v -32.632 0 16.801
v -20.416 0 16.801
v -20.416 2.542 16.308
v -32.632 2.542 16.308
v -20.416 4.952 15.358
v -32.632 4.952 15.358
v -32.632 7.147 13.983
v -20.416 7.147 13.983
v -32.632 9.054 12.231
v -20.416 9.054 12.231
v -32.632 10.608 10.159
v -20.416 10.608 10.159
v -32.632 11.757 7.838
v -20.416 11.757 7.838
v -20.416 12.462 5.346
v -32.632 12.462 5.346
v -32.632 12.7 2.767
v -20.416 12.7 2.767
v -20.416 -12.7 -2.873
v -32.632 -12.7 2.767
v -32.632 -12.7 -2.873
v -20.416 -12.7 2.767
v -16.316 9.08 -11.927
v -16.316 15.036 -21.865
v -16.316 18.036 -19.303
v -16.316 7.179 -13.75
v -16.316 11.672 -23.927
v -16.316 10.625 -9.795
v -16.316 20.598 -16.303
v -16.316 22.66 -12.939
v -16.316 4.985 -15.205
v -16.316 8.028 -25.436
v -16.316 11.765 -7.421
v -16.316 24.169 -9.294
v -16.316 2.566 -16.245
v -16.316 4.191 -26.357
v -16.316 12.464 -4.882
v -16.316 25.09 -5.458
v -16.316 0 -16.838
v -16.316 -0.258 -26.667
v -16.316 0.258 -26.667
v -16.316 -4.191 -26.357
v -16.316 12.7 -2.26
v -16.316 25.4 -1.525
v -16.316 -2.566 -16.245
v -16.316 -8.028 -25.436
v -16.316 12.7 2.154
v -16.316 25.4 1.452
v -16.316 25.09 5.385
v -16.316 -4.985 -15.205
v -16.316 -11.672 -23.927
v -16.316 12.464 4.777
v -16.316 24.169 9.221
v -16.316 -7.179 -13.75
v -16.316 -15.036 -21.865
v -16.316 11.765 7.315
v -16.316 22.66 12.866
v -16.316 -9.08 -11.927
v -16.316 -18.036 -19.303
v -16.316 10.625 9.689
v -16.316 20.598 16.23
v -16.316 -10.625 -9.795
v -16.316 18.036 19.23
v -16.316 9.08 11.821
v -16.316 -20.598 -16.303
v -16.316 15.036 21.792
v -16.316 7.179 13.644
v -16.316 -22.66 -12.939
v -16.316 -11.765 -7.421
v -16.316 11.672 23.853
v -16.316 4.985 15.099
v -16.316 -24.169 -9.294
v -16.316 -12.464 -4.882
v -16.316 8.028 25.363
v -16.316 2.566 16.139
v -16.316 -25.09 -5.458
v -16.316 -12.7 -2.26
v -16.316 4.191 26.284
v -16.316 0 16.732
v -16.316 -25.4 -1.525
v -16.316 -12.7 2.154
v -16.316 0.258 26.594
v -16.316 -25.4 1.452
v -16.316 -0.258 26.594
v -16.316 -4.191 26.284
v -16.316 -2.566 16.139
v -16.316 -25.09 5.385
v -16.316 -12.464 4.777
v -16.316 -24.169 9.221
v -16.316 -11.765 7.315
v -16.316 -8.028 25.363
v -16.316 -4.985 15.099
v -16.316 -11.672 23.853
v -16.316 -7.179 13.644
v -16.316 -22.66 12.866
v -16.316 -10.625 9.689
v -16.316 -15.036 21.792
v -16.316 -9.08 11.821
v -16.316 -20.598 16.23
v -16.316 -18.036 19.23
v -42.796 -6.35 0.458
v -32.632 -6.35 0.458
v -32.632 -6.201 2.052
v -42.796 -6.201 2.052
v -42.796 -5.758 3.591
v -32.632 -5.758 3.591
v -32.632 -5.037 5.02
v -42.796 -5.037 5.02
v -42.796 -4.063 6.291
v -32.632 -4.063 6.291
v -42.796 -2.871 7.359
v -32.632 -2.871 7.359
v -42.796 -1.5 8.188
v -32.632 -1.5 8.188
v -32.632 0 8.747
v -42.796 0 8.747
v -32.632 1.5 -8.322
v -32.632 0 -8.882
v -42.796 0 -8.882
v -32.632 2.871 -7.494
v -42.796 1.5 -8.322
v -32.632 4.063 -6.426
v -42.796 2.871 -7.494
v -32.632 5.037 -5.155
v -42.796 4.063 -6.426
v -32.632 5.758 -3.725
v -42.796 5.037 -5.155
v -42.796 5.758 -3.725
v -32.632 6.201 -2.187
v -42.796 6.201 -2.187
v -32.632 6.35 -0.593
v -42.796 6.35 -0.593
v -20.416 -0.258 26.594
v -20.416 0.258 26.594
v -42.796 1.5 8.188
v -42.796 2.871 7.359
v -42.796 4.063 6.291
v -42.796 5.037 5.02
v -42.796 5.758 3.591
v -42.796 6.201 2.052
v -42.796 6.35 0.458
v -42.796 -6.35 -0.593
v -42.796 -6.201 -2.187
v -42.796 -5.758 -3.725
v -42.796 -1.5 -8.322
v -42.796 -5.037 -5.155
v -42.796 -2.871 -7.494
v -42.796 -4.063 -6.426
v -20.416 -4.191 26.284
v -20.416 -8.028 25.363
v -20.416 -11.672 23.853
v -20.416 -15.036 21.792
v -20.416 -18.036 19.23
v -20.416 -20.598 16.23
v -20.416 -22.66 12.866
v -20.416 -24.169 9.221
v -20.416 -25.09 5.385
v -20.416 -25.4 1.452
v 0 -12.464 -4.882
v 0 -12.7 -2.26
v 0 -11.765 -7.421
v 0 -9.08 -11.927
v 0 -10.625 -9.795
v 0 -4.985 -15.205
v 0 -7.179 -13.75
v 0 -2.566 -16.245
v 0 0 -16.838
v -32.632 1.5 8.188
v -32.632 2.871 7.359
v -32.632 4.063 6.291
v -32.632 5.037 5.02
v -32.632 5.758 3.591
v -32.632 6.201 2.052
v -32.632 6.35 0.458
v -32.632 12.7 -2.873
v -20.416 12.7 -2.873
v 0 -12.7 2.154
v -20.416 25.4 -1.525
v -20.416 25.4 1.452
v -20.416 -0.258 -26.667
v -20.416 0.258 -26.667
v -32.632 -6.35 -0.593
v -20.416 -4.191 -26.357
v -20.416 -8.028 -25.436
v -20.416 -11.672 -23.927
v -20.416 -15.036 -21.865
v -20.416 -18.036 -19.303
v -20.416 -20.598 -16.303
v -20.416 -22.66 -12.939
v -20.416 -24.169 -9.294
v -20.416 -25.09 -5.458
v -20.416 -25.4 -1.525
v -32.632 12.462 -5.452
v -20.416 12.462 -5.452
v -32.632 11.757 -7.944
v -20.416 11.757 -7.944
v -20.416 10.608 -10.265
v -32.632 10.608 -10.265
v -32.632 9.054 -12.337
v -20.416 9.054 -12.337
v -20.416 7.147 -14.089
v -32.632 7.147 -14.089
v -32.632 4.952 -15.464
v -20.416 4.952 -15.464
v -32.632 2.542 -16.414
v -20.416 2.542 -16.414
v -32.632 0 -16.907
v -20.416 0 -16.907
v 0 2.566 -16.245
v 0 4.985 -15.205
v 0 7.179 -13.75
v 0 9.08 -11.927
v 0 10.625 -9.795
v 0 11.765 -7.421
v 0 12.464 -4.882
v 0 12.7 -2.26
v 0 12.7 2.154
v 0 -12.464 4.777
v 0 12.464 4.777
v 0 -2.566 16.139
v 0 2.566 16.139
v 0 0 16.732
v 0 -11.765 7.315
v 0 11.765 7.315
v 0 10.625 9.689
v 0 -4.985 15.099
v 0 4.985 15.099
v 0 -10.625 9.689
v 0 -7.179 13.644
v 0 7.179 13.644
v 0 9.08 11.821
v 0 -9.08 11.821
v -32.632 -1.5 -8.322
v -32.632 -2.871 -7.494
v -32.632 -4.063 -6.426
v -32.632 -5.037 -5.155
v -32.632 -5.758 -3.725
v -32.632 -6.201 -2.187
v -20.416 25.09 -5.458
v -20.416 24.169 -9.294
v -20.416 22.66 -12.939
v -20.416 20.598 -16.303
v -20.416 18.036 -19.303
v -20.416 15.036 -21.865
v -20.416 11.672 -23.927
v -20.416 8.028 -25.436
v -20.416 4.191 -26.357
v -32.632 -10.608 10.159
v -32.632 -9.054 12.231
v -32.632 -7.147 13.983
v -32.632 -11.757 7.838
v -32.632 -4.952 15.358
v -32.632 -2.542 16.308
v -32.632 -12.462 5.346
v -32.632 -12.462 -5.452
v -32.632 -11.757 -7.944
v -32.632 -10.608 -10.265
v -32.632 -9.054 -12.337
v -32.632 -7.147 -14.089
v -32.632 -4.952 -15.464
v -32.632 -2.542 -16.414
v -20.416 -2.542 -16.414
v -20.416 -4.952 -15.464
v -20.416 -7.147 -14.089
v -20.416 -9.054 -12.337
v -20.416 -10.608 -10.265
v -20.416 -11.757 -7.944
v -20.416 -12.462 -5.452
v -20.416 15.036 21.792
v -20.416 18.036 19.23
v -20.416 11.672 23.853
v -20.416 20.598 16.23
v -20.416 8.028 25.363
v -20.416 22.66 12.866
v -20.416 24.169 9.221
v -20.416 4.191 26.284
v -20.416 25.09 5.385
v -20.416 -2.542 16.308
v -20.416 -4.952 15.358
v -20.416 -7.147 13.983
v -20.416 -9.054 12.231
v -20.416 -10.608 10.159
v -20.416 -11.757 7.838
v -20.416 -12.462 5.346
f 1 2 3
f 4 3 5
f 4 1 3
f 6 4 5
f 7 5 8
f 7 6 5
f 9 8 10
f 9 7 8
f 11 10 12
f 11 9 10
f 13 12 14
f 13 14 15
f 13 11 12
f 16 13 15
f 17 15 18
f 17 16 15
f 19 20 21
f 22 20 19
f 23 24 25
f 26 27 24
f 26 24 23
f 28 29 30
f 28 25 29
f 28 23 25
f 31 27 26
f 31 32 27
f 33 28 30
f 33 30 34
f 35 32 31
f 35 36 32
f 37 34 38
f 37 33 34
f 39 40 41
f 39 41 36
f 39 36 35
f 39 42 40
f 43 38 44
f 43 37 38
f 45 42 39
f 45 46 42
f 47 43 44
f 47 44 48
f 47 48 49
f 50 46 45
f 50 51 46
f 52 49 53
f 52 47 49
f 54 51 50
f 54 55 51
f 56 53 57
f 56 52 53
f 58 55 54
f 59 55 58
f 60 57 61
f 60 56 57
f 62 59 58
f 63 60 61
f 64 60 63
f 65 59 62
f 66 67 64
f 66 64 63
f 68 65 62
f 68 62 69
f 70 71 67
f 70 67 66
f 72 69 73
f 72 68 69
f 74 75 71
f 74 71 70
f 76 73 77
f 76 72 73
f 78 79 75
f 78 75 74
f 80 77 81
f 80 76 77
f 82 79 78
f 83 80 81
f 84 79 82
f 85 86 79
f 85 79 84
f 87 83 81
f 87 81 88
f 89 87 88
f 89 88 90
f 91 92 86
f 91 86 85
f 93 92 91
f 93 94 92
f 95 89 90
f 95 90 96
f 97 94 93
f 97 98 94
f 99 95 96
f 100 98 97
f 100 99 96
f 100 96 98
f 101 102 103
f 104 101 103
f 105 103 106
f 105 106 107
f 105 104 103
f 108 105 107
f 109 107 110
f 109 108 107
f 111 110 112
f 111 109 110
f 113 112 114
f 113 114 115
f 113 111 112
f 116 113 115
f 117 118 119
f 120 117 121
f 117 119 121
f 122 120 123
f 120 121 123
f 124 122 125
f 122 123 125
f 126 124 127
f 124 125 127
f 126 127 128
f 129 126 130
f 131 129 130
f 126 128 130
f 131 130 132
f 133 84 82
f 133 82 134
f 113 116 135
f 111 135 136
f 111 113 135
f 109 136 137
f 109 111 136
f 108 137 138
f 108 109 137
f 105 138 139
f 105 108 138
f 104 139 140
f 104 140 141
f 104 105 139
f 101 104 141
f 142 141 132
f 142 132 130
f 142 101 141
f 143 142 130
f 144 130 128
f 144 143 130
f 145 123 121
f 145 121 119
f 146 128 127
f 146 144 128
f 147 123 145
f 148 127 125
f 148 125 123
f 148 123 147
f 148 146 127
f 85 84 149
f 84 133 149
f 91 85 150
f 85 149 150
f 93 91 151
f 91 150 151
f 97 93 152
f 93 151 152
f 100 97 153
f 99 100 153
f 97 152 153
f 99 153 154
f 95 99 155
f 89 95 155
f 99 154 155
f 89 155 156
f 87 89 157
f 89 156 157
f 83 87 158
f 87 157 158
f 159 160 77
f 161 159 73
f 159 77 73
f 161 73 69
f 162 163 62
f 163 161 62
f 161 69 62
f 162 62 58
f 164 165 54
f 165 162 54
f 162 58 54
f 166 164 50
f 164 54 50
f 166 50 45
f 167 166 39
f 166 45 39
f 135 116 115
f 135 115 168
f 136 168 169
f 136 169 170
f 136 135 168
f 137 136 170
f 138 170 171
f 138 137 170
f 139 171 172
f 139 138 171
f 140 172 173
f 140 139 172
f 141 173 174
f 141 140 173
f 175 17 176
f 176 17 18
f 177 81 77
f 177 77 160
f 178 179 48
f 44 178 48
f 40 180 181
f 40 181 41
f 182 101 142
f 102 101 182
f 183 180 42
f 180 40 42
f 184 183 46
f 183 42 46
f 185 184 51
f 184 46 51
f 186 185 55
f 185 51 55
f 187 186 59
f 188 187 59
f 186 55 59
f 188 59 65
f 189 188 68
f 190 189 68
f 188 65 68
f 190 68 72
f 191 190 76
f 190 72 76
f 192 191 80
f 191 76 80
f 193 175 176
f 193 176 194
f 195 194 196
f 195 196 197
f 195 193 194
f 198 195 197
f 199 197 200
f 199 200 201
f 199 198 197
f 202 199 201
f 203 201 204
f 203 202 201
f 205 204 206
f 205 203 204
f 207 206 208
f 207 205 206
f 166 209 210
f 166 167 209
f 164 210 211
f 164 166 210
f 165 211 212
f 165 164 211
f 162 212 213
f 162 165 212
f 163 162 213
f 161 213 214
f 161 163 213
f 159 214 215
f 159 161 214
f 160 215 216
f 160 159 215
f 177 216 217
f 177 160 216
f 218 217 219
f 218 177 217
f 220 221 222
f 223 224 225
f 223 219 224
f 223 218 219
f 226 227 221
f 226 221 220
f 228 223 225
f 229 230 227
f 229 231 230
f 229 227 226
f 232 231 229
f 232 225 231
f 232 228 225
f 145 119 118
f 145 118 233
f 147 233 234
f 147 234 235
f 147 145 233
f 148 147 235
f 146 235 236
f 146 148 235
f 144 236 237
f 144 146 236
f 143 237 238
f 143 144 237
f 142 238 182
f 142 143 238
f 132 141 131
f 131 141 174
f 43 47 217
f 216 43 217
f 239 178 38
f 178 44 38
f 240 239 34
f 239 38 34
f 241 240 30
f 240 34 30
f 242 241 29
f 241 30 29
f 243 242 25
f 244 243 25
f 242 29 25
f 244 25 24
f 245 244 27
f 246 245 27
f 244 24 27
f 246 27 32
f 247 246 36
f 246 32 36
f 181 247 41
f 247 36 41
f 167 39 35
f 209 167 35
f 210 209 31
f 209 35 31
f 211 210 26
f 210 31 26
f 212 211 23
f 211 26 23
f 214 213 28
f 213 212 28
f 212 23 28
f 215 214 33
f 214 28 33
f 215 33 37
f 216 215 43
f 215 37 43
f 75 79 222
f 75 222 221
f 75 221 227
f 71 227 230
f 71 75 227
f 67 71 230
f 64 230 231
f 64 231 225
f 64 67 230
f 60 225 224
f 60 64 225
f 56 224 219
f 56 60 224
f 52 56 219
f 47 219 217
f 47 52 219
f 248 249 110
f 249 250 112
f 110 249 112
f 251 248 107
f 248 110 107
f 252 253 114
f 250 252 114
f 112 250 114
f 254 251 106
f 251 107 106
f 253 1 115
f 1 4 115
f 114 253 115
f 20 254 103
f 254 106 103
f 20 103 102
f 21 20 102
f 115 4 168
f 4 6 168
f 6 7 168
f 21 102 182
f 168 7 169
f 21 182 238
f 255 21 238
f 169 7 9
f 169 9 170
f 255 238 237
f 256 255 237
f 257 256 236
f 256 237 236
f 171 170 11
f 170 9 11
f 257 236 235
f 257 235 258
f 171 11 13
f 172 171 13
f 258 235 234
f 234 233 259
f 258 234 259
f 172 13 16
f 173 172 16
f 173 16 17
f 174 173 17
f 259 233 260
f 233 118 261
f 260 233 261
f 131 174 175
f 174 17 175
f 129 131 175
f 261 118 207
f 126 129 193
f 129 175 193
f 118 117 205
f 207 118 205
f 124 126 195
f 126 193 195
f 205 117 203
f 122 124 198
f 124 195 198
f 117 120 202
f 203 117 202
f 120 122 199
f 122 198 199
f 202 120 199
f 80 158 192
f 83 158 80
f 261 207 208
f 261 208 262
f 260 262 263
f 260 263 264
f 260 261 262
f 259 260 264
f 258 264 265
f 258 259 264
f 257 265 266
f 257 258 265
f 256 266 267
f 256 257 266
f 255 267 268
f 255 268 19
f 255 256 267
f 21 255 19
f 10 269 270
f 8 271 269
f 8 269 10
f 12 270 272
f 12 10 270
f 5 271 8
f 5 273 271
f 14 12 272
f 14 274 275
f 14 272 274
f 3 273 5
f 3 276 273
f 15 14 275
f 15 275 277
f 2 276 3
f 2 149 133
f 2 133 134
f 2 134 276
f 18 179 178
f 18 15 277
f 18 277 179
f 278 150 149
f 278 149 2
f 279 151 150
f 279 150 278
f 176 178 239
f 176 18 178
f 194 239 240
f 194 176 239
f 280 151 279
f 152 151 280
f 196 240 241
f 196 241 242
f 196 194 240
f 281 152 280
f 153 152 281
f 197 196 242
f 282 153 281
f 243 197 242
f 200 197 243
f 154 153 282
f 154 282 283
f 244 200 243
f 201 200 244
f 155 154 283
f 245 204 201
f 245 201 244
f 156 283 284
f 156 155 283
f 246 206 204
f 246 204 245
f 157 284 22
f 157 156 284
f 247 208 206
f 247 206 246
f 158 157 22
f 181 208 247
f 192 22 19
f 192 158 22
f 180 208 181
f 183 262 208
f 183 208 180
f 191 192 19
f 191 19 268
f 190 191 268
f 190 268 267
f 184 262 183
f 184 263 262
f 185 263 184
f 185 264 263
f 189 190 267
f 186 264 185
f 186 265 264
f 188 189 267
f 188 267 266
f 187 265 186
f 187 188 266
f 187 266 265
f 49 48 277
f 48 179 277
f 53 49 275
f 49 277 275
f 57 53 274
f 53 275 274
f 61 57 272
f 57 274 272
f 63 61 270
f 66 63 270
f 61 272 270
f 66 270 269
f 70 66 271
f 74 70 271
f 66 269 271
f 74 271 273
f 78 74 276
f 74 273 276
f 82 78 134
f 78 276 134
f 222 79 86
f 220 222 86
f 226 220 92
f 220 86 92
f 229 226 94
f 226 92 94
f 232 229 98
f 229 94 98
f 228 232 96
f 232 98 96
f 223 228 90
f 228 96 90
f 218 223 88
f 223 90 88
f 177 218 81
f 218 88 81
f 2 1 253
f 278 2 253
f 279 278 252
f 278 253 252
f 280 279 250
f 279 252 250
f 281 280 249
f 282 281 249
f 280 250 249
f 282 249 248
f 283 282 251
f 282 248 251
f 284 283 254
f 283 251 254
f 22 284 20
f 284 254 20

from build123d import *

# Parameters (mm, degrees)
F1_DEPTH    = 25.4
F2_DEPTH    = 12.7
F3_DEPTH    = 6.35
F4_T1_DEPTH = 31.6265151256
F5_T1_DEPTH = 12.2162196785
F6_R        = 25.1416200386
F7_T1_DEPTH = 53.1085051667


# Not quite as in the source:
# - a fillet or chamfer that OpenCascade refuses, or shapes differently, is made with other operations: its cross-section is extruded or revolved along the edge and cut away or added


with BuildPart() as f1:
    # F0 (on Front) → F1 (new body, symmetric)
    with BuildSketch(Plane.XZ):
        Polygon((-20.4155612737, 26.5935901552), (-20.4155612737, 16.8710052967), (-20.4155612737, -16.9768668711), (-20.4155612737, -26.6668144614), (-16.3158904761, -26.6668144614), (-16.3158904761, -16.9768668711), (-16.3158904761, 16.8710052967), (-16.3158904761, 26.5935901552), align=None)
    extrude(amount=F1_DEPTH, both=True)

    # F0 (on Front) → F2 (join, symmetric)
    with BuildSketch(Plane.XZ):
        Polygon((-32.6317809522, 16.8710052967), (-32.6317809522, 9.0427109972), (-32.6317809522, -9.1775488108), (-32.6317809522, -16.9768668711), (-20.4155612737, -16.9768668711), (-20.4155612737, 16.8710052967), align=None)
        Polygon((0, 16.8710052967), (-16.3158904761, 16.8710052967), (-16.3158904761, -16.9768668711), (0, -16.9768668711), (0, -9.1775488108), (0, 0), (0, 9.0427109972), align=None)
    extrude(amount=F2_DEPTH, both=True)

    # F0 (on Front) → F3 (join, symmetric)
    with BuildSketch(Plane.XZ):
        Polygon((-32.6317809522, -9.1775488108), (-32.6317809522, 9.0427109972), (-42.7959375083, 9.0427109972), (-42.7959375083, 0), (-42.7959375083, -9.1775488108), align=None)
    extrude(amount=F3_DEPTH, both=True)

    # F4: fillet of radius 8.5849434278 on 4 edges, made by hand

    # F4_s2 → F4_t1 (cut)
    with BuildSketch(Plane.YZ.offset(-64.2582960778)):
        with BuildLine():
            ThreePointArc((-6.35, 0.4577675694), (-3.8355282861, 6.5282392833), (2.2349434278, 9.0427109972))
            Line((2.2349434278, 9.0427109972), (-6.35, 9.0427109972))
            Line((-6.35, 9.0427109972), (-6.35, 0.4577675694))
        make_face()
        with BuildLine():
            ThreePointArc((2.2349434278, -9.1775488108), (-3.8355282861, -6.6630770969), (-6.35, -0.592605383))
            Line((-6.35, -0.592605383), (-6.35, -9.1775488108))
            Line((-6.35, -9.1775488108), (2.2349434278, -9.1775488108))
        make_face()
        with BuildLine():
            ThreePointArc((-2.2349434278, 9.0427109972), (3.8355282861, 6.5282392833), (6.35, 0.4577675694))
            Line((6.35, 0.4577675694), (6.35, 9.0427109972))
            Line((6.35, 9.0427109972), (-2.2349434278, 9.0427109972))
        make_face()
        with BuildLine():
            ThreePointArc((-2.2349434278, -9.1775488108), (3.8355282861, -6.6630770969), (6.35, -0.592605383))
            Line((6.35, -0.592605383), (6.35, -9.1775488108))
            Line((6.35, -9.1775488108), (-2.2349434278, -9.1775488108))
        make_face()
    extrude(amount=F4_T1_DEPTH, mode=Mode.SUBTRACT)

    # F5: fillet of radius 14.1038356314 on 4 edges, made by hand

    # F5_s2 → F5_t1 (cut)
    with BuildSketch(Plane.YZ.offset(-32.6317809522)):
        with BuildLine():
            ThreePointArc((-1.4038356314, 16.8710052967), (8.5690821843, 12.740087481), (12.7, 2.7671696653))
            Line((12.7, 2.7671696653), (12.9820767126, 2.7671696653))
            Line((12.9820767126, 2.7671696653), (12.9820767126, 17.1530820093))
            Line((12.9820767126, 17.1530820093), (-1.4038356314, 17.1530820093))
            Line((-1.4038356314, 17.1530820093), (-1.4038356314, 16.8710052967))
        make_face()
        with BuildLine():
            ThreePointArc((12.7, -2.8730312397), (8.5690821843, -12.8459490554), (-1.4038356314, -16.9768668711))
            Line((-1.4038356314, -16.9768668711), (-1.4038356314, -17.2589435837))
            Line((-1.4038356314, -17.2589435837), (12.9820767126, -17.2589435837))
            Line((12.9820767126, -17.2589435837), (12.9820767126, -2.8730312397))
            Line((12.9820767126, -2.8730312397), (12.7, -2.8730312397))
        make_face()
        with BuildLine():
            ThreePointArc((1.4038356314, 16.8710052967), (-8.5690821843, 12.740087481), (-12.7, 2.7671696653))
            Line((-12.7, 2.7671696653), (-12.9820767126, 2.7671696653))
            Line((-12.9820767126, 2.7671696653), (-12.9820767126, 17.1530820093))
            Line((-12.9820767126, 17.1530820093), (1.4038356314, 17.1530820093))
            Line((1.4038356314, 17.1530820093), (1.4038356314, 16.8710052967))
        make_face()
        with BuildLine():
            ThreePointArc((1.4038356314, -16.9768668711), (-8.5690821843, -12.8459490554), (-12.7, -2.8730312397))
            Line((-12.7, -2.8730312397), (-12.9820767126, -2.8730312397))
            Line((-12.9820767126, -2.8730312397), (-12.9820767126, -17.2589435837))
            Line((-12.9820767126, -17.2589435837), (1.4038356314, -17.2589435837))
            Line((1.4038356314, -17.2589435837), (1.4038356314, -16.9768668711))
        make_face()
    extrude(amount=F5_T1_DEPTH, mode=Mode.SUBTRACT)

    # F6
    f6_edges = [f1.edges().sort_by_distance(p)[0] for p in [
        (-18.365726, -25.4, 26.59359),
        (-18.365726, -25.4, -26.666814),
        (-18.365726, 25.4, 26.59359),
        (-18.365726, 25.4, -26.666814),
    ]]
    fillet(f6_edges, radius=F6_R)

    # F7: fillet of radius 14.7170458762 on 4 edges, made by hand

    # F7_s2 → F7_t1 (cut)
    with BuildSketch(Plane.YZ.offset(-16.3158904761)):
        with BuildLine():
            ThreePointArc((-2.0170458762, 16.8710052967), (8.3894770619, 12.5604823586), (12.7, 2.1539594205))
            Line((12.7, 2.1539594205), (12.7, 16.8710052967))
            Line((12.7, 16.8710052967), (-2.0170458762, 16.8710052967))
        make_face()
        with BuildLine():
            ThreePointArc((-2.0170458762, -16.9768668711), (8.3894770619, -12.666343933), (12.7, -2.2598209949))
            Line((12.7, -2.2598209949), (12.7, -16.9768668711))
            Line((12.7, -16.9768668711), (-2.0170458762, -16.9768668711))
        make_face()
        with BuildLine():
            ThreePointArc((2.0170458762, 16.8710052967), (-8.3894770619, 12.5604823586), (-12.7, 2.1539594205))
            Line((-12.7, 2.1539594205), (-12.7, 16.8710052967))
            Line((-12.7, 16.8710052967), (2.0170458762, 16.8710052967))
        make_face()
        with BuildLine():
            ThreePointArc((-12.7, -2.2598209949), (-8.3894770619, -12.666343933), (2.0170458762, -16.9768668711))
            Line((2.0170458762, -16.9768668711), (-12.7, -16.9768668711))
            Line((-12.7, -16.9768668711), (-12.7, -2.2598209949))
        make_face()
    extrude(amount=F7_T1_DEPTH, mode=Mode.SUBTRACT)


solid = f1.part
